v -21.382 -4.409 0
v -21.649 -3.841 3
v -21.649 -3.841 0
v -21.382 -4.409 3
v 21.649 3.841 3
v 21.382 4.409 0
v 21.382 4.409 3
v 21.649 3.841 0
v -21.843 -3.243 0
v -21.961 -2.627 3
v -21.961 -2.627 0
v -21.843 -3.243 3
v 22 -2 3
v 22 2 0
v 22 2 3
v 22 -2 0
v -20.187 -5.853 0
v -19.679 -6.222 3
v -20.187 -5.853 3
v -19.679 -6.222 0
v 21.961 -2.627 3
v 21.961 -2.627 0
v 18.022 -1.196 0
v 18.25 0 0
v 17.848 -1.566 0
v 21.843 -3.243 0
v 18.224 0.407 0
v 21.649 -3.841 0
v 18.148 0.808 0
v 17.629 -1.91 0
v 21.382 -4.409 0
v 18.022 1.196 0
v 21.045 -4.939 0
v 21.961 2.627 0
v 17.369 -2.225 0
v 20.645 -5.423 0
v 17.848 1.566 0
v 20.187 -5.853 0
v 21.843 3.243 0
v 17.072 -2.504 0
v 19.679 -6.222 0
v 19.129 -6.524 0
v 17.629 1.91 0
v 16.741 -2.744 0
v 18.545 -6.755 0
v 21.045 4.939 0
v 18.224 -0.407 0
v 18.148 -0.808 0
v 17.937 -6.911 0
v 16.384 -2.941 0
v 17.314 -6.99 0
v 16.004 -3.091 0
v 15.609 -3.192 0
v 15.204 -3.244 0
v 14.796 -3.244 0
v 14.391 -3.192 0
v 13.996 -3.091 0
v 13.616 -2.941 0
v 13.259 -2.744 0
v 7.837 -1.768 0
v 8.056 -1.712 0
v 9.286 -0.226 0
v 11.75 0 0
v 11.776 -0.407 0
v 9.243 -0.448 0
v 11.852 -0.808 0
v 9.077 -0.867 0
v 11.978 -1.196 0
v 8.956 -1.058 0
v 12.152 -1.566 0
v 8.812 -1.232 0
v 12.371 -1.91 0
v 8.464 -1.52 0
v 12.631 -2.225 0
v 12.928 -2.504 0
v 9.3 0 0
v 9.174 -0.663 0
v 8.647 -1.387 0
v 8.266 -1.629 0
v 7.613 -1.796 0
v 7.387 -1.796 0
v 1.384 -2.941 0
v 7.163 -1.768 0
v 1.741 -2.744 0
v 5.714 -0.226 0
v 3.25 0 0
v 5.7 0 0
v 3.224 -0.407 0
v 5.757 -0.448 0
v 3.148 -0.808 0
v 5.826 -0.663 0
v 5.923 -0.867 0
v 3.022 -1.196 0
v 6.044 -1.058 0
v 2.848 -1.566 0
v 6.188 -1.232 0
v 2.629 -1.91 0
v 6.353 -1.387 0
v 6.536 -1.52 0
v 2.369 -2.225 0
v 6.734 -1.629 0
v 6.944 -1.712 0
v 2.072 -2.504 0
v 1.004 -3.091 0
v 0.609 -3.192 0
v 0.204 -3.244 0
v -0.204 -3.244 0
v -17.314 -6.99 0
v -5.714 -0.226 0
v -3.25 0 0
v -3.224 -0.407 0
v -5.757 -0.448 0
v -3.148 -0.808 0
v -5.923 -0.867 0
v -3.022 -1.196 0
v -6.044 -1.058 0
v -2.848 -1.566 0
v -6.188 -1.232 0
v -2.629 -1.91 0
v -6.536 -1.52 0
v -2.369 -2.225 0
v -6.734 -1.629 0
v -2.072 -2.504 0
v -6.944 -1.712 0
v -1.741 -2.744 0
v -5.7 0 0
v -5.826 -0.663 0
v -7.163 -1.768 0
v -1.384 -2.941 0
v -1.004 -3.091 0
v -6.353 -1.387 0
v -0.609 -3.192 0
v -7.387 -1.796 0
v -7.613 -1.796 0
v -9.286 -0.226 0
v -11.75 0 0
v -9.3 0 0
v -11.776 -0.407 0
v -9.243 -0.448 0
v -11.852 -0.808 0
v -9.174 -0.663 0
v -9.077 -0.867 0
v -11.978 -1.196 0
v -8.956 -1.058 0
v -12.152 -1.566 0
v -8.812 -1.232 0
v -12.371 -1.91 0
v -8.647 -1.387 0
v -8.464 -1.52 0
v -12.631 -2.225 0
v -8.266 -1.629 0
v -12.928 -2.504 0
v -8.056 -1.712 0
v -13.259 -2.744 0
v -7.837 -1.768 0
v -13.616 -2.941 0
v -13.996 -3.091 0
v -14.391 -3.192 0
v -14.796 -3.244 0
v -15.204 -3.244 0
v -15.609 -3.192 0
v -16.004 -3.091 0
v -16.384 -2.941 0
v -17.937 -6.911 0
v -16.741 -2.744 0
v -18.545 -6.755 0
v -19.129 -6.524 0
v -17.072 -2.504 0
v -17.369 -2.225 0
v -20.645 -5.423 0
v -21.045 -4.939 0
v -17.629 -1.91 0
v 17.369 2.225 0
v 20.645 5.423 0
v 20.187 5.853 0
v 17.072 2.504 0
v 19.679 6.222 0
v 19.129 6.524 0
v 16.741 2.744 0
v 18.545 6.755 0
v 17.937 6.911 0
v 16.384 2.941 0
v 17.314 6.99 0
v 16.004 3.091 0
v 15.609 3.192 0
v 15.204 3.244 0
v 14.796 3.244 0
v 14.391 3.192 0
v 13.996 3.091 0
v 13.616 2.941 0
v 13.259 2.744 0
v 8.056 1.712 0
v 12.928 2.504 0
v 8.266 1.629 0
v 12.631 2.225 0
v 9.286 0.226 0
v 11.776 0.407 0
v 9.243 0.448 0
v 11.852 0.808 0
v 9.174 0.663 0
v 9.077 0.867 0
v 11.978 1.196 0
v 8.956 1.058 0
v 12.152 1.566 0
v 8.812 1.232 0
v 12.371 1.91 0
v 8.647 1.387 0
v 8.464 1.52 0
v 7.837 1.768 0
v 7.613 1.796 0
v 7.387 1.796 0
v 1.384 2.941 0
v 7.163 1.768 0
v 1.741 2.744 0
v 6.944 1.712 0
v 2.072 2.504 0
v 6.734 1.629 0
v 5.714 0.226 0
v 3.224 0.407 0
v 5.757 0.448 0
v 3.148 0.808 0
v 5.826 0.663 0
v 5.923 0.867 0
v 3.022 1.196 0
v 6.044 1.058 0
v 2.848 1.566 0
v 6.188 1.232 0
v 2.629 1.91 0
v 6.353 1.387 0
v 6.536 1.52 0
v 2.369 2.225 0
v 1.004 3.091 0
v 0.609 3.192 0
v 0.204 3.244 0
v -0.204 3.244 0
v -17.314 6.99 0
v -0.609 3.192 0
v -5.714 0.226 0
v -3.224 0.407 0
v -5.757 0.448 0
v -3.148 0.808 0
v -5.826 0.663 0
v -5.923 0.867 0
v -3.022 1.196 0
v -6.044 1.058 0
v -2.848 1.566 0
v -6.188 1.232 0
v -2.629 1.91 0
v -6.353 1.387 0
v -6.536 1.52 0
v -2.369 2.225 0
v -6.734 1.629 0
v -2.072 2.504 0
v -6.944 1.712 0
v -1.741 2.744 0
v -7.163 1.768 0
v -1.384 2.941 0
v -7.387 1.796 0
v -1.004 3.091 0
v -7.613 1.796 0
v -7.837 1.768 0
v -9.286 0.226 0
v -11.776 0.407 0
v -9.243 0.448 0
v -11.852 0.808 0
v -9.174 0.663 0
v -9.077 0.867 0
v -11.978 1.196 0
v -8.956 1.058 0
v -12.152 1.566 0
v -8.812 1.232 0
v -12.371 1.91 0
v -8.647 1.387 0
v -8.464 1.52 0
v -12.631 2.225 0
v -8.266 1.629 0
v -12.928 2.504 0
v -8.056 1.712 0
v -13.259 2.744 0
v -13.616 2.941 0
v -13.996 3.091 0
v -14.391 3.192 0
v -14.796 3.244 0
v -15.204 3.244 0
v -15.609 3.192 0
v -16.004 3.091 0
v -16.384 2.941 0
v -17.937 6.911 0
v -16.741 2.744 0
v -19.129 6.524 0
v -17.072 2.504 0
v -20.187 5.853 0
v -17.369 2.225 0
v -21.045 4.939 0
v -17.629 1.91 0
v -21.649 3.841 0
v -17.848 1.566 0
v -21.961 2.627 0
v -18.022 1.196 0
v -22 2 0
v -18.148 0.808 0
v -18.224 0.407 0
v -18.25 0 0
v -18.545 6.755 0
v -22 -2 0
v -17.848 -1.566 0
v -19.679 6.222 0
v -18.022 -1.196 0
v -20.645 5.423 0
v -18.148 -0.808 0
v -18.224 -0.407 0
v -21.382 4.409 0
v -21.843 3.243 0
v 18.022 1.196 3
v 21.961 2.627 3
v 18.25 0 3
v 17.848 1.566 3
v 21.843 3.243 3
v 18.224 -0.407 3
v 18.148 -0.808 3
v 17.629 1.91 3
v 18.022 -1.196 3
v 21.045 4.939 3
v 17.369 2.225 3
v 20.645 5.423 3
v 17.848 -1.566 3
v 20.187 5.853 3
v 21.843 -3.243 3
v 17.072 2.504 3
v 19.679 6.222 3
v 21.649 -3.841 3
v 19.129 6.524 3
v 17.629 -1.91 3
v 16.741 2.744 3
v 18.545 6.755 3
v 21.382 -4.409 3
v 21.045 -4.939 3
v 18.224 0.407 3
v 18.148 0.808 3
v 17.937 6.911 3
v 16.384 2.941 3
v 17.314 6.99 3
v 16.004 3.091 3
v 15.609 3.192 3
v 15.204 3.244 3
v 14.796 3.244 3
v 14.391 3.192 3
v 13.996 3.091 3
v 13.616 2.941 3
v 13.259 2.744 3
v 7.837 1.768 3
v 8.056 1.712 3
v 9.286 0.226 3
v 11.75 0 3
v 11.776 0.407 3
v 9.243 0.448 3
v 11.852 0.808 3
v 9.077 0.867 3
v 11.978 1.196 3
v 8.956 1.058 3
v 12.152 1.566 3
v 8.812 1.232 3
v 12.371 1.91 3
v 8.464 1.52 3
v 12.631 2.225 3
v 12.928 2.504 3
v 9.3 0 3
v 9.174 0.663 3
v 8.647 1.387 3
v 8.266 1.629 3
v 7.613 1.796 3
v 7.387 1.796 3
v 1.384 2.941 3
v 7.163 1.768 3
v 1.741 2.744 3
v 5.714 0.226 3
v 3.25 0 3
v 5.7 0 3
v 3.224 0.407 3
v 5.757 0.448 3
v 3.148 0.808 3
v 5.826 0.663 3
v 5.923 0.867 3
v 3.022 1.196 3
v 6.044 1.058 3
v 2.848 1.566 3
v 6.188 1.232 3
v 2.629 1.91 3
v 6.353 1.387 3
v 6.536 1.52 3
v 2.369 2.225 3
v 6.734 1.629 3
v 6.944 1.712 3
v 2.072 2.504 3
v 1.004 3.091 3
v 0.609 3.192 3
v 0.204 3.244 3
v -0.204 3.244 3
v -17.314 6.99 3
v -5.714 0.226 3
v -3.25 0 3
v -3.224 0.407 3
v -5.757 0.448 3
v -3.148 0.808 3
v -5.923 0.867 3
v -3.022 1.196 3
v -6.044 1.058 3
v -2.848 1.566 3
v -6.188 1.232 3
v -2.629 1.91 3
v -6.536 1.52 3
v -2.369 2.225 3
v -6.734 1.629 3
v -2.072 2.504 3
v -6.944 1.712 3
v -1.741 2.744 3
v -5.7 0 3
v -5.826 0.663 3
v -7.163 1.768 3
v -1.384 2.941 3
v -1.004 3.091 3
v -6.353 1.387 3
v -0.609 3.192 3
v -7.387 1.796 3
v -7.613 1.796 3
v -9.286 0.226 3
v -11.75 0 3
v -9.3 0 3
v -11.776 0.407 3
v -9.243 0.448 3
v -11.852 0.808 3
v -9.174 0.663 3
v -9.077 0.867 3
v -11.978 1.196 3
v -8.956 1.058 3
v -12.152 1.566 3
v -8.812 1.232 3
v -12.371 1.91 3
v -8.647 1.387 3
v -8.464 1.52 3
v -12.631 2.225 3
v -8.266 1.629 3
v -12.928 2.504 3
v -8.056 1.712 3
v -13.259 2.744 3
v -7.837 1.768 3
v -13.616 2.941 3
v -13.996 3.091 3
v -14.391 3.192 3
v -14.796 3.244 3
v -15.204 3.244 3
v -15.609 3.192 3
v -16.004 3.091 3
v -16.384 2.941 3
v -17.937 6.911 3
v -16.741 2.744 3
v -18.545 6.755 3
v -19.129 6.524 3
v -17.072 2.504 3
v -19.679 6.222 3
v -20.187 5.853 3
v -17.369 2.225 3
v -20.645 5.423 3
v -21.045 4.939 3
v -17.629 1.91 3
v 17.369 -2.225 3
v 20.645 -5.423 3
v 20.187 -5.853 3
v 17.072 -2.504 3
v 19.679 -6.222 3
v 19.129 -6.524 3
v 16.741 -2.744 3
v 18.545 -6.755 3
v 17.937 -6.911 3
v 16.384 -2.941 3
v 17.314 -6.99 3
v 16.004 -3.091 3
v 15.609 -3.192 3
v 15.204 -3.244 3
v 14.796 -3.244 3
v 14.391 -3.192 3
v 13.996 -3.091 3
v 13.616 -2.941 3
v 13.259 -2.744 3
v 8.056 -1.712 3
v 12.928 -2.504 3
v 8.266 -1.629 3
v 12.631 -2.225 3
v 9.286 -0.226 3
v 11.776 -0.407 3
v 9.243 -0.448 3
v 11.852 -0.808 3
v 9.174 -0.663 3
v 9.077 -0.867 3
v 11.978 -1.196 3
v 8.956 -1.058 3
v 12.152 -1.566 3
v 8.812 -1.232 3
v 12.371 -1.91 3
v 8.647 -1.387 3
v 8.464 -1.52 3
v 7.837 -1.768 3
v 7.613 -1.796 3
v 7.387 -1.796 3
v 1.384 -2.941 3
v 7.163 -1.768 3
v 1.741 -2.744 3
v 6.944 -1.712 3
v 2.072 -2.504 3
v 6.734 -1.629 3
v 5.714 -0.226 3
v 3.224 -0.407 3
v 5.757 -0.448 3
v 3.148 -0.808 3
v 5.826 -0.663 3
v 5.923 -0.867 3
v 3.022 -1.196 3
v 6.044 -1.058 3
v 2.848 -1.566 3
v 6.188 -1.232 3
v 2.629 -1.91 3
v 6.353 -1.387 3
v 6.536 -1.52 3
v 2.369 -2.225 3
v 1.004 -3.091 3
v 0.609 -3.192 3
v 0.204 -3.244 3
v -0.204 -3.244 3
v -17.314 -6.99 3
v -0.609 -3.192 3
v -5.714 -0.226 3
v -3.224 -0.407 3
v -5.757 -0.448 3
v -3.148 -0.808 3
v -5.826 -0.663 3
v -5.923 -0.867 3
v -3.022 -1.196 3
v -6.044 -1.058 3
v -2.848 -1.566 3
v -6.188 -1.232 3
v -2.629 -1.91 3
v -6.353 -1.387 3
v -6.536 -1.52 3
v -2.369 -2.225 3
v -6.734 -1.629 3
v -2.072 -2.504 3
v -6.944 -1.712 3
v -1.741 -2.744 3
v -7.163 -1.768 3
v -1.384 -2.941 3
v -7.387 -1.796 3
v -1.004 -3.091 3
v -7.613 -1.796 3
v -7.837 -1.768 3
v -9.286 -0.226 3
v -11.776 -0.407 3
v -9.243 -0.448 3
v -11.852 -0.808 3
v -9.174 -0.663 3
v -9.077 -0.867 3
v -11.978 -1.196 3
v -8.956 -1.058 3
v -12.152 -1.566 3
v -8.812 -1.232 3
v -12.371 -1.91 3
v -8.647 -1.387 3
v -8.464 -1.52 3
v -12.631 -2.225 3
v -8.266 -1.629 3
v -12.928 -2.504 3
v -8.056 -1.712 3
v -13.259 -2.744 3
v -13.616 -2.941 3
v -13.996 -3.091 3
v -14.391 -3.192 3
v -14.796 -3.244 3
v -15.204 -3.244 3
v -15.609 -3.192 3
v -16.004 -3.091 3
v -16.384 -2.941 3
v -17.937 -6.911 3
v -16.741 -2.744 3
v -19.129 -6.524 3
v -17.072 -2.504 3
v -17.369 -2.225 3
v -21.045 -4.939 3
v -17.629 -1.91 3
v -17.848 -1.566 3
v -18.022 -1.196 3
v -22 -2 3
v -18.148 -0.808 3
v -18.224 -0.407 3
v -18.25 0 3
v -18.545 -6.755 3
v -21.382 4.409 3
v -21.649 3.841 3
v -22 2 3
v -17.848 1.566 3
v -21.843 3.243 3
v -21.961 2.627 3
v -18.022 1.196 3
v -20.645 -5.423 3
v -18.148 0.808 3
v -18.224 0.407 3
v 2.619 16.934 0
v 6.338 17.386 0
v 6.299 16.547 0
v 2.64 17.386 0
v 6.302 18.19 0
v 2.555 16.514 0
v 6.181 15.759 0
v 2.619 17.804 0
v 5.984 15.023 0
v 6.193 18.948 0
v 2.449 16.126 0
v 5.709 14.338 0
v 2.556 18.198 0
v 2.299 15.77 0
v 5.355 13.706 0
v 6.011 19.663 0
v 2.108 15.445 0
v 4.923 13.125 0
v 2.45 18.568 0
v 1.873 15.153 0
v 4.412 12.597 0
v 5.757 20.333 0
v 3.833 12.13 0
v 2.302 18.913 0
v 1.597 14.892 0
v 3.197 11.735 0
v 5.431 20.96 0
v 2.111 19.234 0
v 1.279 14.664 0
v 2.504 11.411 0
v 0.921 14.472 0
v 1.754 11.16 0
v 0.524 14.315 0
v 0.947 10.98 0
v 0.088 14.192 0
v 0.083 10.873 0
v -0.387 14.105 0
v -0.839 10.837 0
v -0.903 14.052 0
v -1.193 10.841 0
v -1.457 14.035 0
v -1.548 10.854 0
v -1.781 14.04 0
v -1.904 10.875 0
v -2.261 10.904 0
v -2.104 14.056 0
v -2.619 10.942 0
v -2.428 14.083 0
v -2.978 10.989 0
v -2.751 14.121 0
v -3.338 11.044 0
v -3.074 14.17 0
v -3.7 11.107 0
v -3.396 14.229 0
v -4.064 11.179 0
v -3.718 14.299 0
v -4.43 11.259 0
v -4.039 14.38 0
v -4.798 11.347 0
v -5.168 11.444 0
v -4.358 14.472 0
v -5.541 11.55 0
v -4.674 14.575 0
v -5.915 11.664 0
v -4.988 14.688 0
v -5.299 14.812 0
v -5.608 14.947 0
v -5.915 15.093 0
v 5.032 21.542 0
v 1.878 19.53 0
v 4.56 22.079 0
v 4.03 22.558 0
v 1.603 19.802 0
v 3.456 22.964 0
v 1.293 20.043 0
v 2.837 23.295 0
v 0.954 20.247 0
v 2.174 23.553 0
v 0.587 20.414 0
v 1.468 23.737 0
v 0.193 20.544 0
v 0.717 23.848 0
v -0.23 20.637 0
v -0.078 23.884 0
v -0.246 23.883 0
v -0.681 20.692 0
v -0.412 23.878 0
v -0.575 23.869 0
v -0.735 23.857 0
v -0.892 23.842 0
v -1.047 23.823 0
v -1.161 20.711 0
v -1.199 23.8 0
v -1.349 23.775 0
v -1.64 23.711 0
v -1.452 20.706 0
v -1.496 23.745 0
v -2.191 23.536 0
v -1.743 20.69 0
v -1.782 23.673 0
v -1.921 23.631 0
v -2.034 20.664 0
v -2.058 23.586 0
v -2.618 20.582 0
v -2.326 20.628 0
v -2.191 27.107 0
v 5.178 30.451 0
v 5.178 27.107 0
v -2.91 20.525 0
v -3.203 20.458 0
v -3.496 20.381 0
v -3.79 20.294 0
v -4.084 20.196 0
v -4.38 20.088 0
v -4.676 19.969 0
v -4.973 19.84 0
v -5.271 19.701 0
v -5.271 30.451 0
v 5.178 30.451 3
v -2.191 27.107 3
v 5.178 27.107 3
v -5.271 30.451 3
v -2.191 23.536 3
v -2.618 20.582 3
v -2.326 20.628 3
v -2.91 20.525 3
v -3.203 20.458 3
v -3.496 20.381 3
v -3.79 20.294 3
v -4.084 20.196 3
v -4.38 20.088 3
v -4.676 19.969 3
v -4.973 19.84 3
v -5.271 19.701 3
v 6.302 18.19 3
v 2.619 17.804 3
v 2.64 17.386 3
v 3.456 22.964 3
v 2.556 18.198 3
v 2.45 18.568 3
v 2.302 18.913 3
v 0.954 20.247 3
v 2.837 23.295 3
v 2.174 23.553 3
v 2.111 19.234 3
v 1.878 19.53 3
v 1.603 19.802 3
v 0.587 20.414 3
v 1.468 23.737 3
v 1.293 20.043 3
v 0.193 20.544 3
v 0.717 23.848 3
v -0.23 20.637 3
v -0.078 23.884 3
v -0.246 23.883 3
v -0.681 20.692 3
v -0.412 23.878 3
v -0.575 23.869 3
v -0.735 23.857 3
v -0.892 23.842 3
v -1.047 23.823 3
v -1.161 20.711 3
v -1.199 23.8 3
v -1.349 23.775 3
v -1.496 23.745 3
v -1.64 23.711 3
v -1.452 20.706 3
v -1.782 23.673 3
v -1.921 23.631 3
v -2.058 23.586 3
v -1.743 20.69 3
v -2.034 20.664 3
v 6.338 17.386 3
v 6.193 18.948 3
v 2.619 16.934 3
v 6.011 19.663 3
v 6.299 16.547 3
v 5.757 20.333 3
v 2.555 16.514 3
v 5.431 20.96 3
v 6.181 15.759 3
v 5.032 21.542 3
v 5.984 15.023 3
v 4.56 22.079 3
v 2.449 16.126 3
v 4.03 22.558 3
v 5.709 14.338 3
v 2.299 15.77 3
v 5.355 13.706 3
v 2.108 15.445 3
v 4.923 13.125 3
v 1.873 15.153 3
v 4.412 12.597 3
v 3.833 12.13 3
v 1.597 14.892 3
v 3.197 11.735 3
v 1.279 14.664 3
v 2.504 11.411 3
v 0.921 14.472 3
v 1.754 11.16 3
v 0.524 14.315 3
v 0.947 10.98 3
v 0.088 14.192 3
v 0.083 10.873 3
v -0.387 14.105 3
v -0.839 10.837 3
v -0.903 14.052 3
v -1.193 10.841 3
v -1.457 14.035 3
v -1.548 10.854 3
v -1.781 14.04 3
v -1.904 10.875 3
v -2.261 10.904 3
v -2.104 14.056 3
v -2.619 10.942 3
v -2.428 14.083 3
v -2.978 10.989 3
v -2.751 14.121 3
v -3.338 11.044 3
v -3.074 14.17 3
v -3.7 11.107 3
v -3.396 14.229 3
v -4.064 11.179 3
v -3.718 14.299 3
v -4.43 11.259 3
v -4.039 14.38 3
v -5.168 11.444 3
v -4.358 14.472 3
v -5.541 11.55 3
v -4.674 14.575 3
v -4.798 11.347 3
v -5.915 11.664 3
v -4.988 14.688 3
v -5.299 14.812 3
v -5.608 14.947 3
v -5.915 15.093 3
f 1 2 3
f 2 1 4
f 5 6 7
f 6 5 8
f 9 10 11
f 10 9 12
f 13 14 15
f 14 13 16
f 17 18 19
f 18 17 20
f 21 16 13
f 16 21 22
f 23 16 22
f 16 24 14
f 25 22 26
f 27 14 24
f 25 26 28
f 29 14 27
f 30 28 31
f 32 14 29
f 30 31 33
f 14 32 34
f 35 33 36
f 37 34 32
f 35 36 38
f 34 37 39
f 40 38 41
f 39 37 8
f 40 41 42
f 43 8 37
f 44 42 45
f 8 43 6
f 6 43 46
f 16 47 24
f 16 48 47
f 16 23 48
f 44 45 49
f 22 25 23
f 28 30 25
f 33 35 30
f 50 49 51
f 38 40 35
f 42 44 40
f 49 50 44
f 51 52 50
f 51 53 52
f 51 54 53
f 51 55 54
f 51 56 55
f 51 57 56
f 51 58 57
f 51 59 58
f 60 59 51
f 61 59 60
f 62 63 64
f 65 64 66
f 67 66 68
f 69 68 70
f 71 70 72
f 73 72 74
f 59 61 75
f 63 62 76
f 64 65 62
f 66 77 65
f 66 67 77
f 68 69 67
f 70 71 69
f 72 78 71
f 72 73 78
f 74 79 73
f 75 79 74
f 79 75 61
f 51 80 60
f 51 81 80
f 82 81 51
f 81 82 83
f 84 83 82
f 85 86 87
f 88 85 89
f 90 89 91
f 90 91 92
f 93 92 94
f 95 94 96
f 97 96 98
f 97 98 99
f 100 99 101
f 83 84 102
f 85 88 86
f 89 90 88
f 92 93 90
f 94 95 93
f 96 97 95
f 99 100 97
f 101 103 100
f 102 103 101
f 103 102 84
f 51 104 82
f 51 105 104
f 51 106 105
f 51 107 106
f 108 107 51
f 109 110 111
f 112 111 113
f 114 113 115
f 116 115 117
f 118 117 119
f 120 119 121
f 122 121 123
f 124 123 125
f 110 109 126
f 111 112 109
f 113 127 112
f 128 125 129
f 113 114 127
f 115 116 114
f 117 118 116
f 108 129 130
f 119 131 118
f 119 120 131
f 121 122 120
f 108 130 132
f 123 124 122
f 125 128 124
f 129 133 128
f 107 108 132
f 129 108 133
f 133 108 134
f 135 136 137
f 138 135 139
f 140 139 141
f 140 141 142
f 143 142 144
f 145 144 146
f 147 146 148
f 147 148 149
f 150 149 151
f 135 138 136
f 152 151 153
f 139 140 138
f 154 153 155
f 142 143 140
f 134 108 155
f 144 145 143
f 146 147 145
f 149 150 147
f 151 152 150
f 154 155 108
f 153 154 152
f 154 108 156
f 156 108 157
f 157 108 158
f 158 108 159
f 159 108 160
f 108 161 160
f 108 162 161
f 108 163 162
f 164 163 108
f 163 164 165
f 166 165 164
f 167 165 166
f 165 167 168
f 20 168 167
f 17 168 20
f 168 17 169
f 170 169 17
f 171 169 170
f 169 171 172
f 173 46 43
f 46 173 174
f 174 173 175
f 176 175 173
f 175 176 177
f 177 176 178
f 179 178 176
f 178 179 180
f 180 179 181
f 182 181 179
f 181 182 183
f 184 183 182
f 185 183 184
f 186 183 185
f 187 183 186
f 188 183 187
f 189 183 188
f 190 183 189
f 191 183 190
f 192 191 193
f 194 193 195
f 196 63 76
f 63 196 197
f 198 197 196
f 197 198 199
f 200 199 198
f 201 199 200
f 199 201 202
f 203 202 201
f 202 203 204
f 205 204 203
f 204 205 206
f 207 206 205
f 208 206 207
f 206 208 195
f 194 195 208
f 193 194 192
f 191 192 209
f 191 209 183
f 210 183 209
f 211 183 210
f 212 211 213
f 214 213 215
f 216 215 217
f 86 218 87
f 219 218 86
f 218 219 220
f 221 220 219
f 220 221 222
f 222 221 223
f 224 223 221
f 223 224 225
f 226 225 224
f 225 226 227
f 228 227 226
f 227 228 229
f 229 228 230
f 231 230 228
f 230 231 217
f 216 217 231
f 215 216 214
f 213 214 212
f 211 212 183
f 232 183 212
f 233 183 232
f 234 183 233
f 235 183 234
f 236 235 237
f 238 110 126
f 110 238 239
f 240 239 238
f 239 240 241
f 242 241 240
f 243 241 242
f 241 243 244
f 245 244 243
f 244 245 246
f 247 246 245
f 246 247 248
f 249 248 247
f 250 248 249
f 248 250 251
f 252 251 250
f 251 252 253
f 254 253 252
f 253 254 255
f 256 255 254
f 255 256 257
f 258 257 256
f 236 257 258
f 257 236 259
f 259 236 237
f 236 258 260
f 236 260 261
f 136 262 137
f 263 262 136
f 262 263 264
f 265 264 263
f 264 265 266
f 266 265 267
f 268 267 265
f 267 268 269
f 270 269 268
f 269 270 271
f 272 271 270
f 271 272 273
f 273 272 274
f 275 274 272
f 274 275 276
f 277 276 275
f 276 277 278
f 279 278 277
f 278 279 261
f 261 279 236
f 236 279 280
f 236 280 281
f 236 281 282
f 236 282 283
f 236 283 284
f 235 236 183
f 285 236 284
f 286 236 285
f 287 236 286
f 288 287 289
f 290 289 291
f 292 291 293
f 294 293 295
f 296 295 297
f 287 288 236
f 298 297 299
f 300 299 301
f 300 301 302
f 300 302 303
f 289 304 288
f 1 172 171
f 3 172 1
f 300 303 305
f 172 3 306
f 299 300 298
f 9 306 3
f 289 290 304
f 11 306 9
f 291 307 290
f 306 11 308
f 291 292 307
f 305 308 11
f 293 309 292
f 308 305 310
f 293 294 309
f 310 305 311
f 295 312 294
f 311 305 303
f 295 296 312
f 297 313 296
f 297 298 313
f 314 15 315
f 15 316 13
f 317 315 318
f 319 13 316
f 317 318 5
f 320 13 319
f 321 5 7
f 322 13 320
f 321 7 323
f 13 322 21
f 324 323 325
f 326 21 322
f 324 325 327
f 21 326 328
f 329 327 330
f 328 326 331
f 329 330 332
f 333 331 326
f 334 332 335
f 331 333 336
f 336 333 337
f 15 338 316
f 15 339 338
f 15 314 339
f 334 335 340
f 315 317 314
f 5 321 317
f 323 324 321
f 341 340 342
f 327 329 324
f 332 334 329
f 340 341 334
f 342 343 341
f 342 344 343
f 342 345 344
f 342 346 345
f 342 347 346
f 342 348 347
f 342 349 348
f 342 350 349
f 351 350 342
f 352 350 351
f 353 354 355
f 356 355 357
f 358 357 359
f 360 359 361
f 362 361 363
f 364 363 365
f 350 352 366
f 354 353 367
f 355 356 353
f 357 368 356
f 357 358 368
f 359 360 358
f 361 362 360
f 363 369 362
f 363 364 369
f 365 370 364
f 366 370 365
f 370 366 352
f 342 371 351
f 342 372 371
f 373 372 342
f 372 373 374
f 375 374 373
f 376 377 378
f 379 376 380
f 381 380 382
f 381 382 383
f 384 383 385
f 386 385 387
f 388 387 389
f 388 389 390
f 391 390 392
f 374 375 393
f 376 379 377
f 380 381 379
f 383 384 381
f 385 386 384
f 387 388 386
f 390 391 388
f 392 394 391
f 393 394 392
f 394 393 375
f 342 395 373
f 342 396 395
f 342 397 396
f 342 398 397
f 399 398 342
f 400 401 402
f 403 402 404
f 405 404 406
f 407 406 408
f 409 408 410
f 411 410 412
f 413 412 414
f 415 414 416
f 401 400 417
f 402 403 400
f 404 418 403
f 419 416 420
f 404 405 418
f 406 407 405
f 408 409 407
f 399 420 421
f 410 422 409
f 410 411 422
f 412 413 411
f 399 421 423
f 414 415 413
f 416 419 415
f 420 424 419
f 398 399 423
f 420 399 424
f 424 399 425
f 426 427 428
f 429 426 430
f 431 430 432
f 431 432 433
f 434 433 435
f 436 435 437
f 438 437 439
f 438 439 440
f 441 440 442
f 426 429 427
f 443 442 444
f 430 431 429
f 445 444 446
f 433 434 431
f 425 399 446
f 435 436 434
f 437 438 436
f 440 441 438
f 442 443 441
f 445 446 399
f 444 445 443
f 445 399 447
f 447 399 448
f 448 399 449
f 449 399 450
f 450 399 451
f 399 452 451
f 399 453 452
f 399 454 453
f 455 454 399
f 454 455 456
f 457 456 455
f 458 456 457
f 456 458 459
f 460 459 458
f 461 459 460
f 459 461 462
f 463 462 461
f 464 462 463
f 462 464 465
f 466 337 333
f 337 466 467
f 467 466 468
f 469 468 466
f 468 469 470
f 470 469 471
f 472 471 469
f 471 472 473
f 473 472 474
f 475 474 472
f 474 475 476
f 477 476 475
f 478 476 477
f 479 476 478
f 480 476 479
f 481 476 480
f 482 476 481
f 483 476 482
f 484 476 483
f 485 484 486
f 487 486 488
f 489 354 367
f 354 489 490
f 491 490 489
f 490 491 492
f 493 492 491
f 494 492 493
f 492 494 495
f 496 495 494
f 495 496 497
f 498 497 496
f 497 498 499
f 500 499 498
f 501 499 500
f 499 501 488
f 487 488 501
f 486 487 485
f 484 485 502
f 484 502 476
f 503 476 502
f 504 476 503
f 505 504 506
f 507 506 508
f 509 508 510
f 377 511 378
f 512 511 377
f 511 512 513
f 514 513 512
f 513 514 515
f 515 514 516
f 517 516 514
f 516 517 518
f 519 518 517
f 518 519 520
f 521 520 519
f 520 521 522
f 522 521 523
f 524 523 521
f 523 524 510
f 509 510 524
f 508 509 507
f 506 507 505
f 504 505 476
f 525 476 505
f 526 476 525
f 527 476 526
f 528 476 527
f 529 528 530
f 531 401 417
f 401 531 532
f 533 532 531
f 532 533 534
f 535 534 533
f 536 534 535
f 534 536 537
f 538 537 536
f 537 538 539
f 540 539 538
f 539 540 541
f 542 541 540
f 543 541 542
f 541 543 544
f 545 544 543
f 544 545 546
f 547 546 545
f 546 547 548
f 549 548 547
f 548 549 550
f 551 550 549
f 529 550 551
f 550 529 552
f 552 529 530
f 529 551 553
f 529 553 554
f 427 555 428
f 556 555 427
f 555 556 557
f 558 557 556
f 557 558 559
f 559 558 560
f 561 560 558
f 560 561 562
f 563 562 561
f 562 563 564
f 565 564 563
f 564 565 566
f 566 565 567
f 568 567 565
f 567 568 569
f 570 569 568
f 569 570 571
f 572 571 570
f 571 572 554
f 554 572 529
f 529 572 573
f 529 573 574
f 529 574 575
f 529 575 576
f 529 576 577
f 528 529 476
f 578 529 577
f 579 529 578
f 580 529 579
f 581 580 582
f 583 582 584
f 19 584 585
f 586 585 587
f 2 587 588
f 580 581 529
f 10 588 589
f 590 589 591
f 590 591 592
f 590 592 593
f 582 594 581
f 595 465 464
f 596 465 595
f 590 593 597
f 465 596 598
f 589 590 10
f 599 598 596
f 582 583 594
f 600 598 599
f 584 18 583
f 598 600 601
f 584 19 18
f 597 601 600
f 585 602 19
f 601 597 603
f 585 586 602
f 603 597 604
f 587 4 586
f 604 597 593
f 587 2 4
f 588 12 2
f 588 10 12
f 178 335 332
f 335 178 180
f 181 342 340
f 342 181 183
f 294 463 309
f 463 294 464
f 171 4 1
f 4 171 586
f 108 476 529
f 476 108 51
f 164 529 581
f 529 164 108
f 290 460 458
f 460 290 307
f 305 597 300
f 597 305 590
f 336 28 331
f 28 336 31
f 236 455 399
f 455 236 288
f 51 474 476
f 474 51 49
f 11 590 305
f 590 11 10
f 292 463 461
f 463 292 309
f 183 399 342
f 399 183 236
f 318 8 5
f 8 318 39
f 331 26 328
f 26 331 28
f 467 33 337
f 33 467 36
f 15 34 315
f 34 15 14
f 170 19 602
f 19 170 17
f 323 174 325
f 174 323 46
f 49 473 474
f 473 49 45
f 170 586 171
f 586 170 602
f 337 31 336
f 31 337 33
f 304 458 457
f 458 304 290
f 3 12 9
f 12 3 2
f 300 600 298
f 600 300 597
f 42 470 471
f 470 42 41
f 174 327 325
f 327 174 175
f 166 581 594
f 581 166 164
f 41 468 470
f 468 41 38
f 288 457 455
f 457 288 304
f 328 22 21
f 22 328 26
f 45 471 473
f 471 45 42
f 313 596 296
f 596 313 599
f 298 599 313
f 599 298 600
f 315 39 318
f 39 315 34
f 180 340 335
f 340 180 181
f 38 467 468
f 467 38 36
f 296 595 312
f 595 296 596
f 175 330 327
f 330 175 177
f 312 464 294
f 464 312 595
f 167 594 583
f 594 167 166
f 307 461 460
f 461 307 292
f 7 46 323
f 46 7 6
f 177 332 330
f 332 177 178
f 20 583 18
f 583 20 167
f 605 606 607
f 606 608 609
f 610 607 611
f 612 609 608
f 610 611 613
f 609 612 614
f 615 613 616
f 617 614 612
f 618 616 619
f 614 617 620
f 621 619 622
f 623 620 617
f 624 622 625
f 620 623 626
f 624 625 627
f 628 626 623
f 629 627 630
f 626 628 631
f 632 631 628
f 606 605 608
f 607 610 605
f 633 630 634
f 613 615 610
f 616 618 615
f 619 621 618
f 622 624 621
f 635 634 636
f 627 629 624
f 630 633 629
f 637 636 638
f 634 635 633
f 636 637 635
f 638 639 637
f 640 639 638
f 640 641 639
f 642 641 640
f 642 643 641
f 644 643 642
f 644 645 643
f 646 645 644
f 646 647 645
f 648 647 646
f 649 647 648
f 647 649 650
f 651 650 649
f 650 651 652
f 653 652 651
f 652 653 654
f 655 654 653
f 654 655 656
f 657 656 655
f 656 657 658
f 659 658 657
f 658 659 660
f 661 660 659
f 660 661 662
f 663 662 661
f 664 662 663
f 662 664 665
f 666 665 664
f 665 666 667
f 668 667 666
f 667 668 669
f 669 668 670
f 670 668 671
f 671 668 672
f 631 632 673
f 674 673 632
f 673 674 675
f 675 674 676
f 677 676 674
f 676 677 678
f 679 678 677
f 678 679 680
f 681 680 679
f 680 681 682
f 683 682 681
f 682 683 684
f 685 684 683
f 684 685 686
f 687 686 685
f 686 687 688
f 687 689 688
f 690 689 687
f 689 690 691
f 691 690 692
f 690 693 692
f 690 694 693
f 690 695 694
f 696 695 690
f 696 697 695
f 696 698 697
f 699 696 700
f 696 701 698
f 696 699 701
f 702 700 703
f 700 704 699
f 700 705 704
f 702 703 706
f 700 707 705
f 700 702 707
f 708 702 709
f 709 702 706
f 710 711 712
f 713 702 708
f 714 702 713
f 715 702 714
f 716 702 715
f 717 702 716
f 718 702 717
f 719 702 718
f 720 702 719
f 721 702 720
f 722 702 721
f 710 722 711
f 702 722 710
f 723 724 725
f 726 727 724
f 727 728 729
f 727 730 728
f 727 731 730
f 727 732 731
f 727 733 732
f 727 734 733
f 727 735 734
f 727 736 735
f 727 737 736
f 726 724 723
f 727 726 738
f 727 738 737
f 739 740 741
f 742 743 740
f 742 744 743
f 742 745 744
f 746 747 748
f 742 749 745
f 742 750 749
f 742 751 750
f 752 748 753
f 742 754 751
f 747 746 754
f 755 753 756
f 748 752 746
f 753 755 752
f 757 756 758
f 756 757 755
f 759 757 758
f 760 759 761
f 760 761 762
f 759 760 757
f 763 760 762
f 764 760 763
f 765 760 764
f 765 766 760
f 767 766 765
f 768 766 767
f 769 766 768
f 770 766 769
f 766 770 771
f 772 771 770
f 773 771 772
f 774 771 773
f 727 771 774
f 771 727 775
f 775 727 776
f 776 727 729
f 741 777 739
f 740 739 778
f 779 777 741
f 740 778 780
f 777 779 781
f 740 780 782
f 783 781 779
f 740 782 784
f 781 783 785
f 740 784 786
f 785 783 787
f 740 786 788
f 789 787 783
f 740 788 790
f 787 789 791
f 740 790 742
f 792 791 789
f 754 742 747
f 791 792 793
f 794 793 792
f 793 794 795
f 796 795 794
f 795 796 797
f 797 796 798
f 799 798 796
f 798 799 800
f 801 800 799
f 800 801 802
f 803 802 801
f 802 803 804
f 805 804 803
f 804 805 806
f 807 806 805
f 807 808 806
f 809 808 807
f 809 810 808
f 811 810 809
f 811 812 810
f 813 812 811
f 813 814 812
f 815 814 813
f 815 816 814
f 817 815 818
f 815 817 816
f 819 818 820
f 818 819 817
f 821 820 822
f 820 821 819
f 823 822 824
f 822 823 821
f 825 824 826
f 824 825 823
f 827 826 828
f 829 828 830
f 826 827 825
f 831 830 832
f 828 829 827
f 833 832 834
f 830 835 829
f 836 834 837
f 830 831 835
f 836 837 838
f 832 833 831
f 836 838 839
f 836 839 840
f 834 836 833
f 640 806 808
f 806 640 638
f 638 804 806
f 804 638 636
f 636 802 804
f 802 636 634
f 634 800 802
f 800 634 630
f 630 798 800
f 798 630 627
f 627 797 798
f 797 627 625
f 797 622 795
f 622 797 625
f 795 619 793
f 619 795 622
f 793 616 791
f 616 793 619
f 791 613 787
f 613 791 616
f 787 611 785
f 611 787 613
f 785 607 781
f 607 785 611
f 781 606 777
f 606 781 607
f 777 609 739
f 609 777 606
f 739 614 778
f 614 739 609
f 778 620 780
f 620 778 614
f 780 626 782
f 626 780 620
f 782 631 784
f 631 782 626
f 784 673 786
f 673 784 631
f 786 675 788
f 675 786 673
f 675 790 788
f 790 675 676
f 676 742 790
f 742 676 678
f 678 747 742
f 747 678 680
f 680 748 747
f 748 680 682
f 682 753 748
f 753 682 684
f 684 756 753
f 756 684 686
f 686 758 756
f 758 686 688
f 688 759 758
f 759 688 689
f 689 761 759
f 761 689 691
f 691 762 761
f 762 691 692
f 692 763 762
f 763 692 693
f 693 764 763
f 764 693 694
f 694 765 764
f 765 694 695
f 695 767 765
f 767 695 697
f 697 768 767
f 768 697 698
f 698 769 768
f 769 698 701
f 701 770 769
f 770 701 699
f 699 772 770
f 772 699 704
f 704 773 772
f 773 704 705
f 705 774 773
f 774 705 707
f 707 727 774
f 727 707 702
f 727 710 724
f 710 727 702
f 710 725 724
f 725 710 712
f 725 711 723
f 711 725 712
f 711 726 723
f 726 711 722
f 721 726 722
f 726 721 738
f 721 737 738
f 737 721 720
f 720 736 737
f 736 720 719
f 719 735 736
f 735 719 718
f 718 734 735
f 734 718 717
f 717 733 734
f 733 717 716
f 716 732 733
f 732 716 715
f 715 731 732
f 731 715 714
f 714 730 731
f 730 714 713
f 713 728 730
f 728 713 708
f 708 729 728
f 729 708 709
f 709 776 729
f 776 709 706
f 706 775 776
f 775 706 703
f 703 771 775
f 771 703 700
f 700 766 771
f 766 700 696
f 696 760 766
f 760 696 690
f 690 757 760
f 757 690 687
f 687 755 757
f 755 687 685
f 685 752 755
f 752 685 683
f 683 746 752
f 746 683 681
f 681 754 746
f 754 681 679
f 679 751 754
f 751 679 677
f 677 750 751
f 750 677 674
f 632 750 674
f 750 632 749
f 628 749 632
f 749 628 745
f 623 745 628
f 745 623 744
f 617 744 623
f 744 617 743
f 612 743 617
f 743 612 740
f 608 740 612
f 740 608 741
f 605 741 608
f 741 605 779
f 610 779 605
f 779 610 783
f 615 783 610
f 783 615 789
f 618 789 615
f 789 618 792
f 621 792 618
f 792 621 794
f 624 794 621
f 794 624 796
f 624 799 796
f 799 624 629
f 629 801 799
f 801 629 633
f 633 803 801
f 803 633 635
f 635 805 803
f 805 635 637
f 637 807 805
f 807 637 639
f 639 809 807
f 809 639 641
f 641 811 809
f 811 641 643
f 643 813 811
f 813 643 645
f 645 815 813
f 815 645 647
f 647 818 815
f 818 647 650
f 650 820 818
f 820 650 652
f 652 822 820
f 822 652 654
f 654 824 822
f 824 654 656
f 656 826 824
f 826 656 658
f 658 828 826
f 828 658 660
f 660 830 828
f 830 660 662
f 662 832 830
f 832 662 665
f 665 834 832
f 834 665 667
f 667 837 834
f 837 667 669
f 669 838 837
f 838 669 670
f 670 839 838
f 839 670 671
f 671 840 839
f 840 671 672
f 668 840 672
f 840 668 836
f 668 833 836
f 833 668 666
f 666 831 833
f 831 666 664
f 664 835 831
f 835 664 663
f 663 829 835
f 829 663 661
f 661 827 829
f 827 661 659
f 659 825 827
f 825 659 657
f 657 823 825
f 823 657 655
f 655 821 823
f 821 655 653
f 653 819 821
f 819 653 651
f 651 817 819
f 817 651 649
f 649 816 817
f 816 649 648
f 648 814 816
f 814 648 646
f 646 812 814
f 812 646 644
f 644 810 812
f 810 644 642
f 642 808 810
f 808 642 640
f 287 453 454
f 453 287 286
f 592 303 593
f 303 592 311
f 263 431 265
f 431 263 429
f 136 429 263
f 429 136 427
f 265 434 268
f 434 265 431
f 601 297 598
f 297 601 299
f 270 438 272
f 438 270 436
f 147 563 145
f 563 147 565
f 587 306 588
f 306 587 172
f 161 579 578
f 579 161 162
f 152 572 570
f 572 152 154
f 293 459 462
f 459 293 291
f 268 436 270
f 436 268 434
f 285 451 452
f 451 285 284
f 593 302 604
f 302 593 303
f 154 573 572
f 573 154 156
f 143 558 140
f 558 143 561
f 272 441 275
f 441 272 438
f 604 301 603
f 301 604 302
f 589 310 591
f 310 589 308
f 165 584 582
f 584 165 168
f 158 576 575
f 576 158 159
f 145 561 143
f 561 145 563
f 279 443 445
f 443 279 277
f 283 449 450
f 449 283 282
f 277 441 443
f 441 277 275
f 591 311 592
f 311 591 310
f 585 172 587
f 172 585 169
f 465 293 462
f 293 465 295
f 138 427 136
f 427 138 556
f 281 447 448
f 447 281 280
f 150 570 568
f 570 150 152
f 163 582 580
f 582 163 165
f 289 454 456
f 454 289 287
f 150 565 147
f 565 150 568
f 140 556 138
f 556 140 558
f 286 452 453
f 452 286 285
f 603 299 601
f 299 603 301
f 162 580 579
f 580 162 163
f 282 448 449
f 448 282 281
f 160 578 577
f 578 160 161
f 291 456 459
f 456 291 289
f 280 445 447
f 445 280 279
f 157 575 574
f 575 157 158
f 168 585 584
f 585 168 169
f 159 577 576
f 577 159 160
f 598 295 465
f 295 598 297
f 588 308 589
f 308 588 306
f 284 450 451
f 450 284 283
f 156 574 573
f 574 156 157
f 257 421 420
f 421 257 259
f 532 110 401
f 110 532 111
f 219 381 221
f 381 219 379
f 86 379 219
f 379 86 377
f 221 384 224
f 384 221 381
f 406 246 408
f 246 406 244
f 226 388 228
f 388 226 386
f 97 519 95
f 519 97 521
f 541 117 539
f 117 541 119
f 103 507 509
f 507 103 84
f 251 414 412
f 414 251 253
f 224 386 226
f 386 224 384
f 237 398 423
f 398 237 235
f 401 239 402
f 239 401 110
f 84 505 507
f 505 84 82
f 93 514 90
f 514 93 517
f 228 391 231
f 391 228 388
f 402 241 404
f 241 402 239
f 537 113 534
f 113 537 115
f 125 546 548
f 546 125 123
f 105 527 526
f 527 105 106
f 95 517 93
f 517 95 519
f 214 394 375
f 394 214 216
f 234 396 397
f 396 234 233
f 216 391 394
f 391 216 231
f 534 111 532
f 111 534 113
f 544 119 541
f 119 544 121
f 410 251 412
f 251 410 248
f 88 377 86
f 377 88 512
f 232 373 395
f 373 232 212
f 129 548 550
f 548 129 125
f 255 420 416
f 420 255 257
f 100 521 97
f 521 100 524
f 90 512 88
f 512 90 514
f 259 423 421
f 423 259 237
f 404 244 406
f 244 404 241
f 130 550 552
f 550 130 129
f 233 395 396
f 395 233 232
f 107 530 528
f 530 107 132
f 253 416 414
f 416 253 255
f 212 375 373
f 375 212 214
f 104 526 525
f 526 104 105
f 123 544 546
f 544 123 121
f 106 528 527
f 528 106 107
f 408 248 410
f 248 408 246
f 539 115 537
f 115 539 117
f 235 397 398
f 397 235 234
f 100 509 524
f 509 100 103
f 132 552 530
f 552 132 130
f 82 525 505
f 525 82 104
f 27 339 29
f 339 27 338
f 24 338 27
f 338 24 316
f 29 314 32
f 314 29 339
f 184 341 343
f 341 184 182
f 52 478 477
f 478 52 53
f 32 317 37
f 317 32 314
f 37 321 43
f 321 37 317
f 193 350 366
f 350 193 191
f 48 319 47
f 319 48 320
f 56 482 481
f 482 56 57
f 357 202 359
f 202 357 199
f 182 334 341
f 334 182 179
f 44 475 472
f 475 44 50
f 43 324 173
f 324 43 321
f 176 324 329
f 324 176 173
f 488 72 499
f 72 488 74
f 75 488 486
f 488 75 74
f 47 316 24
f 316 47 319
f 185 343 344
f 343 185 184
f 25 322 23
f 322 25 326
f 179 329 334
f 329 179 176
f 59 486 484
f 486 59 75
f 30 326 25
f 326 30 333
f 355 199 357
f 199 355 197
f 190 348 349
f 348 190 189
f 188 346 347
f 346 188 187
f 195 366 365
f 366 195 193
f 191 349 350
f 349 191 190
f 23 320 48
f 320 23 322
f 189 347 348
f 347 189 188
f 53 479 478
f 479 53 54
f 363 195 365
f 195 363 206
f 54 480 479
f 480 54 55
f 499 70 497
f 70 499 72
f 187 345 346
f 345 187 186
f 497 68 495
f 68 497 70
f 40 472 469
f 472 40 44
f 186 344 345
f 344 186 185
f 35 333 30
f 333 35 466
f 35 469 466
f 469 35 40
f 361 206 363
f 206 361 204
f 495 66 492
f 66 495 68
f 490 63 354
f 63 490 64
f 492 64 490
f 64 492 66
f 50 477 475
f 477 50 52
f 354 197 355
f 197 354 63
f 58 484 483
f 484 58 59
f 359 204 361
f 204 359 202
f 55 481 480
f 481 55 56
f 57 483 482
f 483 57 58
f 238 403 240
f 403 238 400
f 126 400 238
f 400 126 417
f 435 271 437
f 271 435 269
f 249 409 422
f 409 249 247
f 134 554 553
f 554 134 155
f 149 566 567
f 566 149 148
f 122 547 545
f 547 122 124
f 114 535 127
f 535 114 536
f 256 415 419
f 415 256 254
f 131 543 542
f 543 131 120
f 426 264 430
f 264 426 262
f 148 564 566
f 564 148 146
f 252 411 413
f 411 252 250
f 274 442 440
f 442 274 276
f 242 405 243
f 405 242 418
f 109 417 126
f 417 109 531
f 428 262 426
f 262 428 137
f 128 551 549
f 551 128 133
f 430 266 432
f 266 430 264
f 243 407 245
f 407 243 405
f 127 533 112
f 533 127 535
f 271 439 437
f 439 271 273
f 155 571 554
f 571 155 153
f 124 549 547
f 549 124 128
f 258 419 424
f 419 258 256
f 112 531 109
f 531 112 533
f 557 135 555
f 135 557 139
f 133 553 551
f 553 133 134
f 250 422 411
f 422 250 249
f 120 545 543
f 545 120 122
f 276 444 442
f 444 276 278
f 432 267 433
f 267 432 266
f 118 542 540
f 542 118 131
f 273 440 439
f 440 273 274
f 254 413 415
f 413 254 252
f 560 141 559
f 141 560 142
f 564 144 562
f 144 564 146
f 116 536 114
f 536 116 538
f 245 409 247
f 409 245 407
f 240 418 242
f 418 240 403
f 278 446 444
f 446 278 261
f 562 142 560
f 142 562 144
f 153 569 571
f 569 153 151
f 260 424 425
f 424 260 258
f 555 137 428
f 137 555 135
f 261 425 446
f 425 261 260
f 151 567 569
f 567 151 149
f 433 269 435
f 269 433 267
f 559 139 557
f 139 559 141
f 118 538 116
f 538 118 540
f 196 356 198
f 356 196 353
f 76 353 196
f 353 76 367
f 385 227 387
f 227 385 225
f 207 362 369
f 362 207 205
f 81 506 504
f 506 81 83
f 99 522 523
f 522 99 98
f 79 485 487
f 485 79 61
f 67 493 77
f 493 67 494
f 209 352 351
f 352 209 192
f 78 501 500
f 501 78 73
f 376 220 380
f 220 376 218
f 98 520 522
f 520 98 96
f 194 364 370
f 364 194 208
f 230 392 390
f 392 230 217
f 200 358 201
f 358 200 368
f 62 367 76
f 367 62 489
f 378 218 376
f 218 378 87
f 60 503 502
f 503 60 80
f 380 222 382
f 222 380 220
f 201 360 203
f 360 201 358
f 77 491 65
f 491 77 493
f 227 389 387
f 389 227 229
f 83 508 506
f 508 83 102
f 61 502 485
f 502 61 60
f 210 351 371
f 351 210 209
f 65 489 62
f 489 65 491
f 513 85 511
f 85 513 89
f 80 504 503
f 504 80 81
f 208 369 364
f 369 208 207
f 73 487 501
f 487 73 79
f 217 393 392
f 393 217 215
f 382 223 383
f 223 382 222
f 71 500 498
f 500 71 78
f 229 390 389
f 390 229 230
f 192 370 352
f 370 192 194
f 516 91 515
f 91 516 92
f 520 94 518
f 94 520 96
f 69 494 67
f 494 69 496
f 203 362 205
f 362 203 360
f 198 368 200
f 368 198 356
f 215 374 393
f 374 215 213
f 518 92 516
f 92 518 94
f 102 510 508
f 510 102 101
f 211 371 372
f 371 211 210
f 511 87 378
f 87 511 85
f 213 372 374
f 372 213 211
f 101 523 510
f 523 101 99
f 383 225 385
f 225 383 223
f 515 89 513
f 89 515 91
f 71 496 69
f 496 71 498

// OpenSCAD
$fn = 50;


difference() {
	union() {
		hull() {
			translate(v = [-17.0000000000, 2.0000000000, 0]) {
				cylinder(h = 3, r = 5);
			}
			translate(v = [17.0000000000, 2.0000000000, 0]) {
				cylinder(h = 3, r = 5);
			}
			translate(v = [-17.0000000000, -2.0000000000, 0]) {
				cylinder(h = 3, r = 5);
			}
			translate(v = [17.0000000000, -2.0000000000, 0]) {
				cylinder(h = 3, r = 5);
			}
		}
		translate(v = [0, 30.0000000000, 0]) {
			linear_extrude(height = 3) {
				text(font = "DejaVu Sans Mono:style=Bold", halign = "center", size = 19.0000000000, text = "5", valign = "top");
			}
		}
	}
	union() {
		translate(v = [-15.0000000000, 0.0000000000, 0]) {
			translate(v = [0, 0, -100]) {
				cylinder(h = 200, r = 3.2500000000);
			}
		}
		translate(v = [0, 0, -100]) {
			cylinder(h = 200, r = 3.2500000000);
		}
		translate(v = [15.0000000000, 0.0000000000, 0]) {
			translate(v = [0, 0, -100]) {
				cylinder(h = 200, r = 3.2500000000);
			}
		}
		translate(v = [-15.0000000000, 0.0000000000, 0]) {
			translate(v = [0, 0, -100]) {
				cylinder(h = 200, r = 1.8000000000);
			}
		}
		translate(v = [-7.5000000000, 0.0000000000, 0]) {
			translate(v = [0, 0, -100]) {
				cylinder(h = 200, r = 1.8000000000);
			}
		}
		translate(v = [0, 0, -100]) {
			cylinder(h = 200, r = 1.8000000000);
		}
		translate(v = [7.5000000000, 0.0000000000, 0]) {
			translate(v = [0, 0, -100]) {
				cylinder(h = 200, r = 1.8000000000);
			}
		}
		translate(v = [15.0000000000, 0.0000000000, 0]) {
			translate(v = [0, 0, -100]) {
				cylinder(h = 200, r = 1.8000000000);
			}
		}
	}
}
